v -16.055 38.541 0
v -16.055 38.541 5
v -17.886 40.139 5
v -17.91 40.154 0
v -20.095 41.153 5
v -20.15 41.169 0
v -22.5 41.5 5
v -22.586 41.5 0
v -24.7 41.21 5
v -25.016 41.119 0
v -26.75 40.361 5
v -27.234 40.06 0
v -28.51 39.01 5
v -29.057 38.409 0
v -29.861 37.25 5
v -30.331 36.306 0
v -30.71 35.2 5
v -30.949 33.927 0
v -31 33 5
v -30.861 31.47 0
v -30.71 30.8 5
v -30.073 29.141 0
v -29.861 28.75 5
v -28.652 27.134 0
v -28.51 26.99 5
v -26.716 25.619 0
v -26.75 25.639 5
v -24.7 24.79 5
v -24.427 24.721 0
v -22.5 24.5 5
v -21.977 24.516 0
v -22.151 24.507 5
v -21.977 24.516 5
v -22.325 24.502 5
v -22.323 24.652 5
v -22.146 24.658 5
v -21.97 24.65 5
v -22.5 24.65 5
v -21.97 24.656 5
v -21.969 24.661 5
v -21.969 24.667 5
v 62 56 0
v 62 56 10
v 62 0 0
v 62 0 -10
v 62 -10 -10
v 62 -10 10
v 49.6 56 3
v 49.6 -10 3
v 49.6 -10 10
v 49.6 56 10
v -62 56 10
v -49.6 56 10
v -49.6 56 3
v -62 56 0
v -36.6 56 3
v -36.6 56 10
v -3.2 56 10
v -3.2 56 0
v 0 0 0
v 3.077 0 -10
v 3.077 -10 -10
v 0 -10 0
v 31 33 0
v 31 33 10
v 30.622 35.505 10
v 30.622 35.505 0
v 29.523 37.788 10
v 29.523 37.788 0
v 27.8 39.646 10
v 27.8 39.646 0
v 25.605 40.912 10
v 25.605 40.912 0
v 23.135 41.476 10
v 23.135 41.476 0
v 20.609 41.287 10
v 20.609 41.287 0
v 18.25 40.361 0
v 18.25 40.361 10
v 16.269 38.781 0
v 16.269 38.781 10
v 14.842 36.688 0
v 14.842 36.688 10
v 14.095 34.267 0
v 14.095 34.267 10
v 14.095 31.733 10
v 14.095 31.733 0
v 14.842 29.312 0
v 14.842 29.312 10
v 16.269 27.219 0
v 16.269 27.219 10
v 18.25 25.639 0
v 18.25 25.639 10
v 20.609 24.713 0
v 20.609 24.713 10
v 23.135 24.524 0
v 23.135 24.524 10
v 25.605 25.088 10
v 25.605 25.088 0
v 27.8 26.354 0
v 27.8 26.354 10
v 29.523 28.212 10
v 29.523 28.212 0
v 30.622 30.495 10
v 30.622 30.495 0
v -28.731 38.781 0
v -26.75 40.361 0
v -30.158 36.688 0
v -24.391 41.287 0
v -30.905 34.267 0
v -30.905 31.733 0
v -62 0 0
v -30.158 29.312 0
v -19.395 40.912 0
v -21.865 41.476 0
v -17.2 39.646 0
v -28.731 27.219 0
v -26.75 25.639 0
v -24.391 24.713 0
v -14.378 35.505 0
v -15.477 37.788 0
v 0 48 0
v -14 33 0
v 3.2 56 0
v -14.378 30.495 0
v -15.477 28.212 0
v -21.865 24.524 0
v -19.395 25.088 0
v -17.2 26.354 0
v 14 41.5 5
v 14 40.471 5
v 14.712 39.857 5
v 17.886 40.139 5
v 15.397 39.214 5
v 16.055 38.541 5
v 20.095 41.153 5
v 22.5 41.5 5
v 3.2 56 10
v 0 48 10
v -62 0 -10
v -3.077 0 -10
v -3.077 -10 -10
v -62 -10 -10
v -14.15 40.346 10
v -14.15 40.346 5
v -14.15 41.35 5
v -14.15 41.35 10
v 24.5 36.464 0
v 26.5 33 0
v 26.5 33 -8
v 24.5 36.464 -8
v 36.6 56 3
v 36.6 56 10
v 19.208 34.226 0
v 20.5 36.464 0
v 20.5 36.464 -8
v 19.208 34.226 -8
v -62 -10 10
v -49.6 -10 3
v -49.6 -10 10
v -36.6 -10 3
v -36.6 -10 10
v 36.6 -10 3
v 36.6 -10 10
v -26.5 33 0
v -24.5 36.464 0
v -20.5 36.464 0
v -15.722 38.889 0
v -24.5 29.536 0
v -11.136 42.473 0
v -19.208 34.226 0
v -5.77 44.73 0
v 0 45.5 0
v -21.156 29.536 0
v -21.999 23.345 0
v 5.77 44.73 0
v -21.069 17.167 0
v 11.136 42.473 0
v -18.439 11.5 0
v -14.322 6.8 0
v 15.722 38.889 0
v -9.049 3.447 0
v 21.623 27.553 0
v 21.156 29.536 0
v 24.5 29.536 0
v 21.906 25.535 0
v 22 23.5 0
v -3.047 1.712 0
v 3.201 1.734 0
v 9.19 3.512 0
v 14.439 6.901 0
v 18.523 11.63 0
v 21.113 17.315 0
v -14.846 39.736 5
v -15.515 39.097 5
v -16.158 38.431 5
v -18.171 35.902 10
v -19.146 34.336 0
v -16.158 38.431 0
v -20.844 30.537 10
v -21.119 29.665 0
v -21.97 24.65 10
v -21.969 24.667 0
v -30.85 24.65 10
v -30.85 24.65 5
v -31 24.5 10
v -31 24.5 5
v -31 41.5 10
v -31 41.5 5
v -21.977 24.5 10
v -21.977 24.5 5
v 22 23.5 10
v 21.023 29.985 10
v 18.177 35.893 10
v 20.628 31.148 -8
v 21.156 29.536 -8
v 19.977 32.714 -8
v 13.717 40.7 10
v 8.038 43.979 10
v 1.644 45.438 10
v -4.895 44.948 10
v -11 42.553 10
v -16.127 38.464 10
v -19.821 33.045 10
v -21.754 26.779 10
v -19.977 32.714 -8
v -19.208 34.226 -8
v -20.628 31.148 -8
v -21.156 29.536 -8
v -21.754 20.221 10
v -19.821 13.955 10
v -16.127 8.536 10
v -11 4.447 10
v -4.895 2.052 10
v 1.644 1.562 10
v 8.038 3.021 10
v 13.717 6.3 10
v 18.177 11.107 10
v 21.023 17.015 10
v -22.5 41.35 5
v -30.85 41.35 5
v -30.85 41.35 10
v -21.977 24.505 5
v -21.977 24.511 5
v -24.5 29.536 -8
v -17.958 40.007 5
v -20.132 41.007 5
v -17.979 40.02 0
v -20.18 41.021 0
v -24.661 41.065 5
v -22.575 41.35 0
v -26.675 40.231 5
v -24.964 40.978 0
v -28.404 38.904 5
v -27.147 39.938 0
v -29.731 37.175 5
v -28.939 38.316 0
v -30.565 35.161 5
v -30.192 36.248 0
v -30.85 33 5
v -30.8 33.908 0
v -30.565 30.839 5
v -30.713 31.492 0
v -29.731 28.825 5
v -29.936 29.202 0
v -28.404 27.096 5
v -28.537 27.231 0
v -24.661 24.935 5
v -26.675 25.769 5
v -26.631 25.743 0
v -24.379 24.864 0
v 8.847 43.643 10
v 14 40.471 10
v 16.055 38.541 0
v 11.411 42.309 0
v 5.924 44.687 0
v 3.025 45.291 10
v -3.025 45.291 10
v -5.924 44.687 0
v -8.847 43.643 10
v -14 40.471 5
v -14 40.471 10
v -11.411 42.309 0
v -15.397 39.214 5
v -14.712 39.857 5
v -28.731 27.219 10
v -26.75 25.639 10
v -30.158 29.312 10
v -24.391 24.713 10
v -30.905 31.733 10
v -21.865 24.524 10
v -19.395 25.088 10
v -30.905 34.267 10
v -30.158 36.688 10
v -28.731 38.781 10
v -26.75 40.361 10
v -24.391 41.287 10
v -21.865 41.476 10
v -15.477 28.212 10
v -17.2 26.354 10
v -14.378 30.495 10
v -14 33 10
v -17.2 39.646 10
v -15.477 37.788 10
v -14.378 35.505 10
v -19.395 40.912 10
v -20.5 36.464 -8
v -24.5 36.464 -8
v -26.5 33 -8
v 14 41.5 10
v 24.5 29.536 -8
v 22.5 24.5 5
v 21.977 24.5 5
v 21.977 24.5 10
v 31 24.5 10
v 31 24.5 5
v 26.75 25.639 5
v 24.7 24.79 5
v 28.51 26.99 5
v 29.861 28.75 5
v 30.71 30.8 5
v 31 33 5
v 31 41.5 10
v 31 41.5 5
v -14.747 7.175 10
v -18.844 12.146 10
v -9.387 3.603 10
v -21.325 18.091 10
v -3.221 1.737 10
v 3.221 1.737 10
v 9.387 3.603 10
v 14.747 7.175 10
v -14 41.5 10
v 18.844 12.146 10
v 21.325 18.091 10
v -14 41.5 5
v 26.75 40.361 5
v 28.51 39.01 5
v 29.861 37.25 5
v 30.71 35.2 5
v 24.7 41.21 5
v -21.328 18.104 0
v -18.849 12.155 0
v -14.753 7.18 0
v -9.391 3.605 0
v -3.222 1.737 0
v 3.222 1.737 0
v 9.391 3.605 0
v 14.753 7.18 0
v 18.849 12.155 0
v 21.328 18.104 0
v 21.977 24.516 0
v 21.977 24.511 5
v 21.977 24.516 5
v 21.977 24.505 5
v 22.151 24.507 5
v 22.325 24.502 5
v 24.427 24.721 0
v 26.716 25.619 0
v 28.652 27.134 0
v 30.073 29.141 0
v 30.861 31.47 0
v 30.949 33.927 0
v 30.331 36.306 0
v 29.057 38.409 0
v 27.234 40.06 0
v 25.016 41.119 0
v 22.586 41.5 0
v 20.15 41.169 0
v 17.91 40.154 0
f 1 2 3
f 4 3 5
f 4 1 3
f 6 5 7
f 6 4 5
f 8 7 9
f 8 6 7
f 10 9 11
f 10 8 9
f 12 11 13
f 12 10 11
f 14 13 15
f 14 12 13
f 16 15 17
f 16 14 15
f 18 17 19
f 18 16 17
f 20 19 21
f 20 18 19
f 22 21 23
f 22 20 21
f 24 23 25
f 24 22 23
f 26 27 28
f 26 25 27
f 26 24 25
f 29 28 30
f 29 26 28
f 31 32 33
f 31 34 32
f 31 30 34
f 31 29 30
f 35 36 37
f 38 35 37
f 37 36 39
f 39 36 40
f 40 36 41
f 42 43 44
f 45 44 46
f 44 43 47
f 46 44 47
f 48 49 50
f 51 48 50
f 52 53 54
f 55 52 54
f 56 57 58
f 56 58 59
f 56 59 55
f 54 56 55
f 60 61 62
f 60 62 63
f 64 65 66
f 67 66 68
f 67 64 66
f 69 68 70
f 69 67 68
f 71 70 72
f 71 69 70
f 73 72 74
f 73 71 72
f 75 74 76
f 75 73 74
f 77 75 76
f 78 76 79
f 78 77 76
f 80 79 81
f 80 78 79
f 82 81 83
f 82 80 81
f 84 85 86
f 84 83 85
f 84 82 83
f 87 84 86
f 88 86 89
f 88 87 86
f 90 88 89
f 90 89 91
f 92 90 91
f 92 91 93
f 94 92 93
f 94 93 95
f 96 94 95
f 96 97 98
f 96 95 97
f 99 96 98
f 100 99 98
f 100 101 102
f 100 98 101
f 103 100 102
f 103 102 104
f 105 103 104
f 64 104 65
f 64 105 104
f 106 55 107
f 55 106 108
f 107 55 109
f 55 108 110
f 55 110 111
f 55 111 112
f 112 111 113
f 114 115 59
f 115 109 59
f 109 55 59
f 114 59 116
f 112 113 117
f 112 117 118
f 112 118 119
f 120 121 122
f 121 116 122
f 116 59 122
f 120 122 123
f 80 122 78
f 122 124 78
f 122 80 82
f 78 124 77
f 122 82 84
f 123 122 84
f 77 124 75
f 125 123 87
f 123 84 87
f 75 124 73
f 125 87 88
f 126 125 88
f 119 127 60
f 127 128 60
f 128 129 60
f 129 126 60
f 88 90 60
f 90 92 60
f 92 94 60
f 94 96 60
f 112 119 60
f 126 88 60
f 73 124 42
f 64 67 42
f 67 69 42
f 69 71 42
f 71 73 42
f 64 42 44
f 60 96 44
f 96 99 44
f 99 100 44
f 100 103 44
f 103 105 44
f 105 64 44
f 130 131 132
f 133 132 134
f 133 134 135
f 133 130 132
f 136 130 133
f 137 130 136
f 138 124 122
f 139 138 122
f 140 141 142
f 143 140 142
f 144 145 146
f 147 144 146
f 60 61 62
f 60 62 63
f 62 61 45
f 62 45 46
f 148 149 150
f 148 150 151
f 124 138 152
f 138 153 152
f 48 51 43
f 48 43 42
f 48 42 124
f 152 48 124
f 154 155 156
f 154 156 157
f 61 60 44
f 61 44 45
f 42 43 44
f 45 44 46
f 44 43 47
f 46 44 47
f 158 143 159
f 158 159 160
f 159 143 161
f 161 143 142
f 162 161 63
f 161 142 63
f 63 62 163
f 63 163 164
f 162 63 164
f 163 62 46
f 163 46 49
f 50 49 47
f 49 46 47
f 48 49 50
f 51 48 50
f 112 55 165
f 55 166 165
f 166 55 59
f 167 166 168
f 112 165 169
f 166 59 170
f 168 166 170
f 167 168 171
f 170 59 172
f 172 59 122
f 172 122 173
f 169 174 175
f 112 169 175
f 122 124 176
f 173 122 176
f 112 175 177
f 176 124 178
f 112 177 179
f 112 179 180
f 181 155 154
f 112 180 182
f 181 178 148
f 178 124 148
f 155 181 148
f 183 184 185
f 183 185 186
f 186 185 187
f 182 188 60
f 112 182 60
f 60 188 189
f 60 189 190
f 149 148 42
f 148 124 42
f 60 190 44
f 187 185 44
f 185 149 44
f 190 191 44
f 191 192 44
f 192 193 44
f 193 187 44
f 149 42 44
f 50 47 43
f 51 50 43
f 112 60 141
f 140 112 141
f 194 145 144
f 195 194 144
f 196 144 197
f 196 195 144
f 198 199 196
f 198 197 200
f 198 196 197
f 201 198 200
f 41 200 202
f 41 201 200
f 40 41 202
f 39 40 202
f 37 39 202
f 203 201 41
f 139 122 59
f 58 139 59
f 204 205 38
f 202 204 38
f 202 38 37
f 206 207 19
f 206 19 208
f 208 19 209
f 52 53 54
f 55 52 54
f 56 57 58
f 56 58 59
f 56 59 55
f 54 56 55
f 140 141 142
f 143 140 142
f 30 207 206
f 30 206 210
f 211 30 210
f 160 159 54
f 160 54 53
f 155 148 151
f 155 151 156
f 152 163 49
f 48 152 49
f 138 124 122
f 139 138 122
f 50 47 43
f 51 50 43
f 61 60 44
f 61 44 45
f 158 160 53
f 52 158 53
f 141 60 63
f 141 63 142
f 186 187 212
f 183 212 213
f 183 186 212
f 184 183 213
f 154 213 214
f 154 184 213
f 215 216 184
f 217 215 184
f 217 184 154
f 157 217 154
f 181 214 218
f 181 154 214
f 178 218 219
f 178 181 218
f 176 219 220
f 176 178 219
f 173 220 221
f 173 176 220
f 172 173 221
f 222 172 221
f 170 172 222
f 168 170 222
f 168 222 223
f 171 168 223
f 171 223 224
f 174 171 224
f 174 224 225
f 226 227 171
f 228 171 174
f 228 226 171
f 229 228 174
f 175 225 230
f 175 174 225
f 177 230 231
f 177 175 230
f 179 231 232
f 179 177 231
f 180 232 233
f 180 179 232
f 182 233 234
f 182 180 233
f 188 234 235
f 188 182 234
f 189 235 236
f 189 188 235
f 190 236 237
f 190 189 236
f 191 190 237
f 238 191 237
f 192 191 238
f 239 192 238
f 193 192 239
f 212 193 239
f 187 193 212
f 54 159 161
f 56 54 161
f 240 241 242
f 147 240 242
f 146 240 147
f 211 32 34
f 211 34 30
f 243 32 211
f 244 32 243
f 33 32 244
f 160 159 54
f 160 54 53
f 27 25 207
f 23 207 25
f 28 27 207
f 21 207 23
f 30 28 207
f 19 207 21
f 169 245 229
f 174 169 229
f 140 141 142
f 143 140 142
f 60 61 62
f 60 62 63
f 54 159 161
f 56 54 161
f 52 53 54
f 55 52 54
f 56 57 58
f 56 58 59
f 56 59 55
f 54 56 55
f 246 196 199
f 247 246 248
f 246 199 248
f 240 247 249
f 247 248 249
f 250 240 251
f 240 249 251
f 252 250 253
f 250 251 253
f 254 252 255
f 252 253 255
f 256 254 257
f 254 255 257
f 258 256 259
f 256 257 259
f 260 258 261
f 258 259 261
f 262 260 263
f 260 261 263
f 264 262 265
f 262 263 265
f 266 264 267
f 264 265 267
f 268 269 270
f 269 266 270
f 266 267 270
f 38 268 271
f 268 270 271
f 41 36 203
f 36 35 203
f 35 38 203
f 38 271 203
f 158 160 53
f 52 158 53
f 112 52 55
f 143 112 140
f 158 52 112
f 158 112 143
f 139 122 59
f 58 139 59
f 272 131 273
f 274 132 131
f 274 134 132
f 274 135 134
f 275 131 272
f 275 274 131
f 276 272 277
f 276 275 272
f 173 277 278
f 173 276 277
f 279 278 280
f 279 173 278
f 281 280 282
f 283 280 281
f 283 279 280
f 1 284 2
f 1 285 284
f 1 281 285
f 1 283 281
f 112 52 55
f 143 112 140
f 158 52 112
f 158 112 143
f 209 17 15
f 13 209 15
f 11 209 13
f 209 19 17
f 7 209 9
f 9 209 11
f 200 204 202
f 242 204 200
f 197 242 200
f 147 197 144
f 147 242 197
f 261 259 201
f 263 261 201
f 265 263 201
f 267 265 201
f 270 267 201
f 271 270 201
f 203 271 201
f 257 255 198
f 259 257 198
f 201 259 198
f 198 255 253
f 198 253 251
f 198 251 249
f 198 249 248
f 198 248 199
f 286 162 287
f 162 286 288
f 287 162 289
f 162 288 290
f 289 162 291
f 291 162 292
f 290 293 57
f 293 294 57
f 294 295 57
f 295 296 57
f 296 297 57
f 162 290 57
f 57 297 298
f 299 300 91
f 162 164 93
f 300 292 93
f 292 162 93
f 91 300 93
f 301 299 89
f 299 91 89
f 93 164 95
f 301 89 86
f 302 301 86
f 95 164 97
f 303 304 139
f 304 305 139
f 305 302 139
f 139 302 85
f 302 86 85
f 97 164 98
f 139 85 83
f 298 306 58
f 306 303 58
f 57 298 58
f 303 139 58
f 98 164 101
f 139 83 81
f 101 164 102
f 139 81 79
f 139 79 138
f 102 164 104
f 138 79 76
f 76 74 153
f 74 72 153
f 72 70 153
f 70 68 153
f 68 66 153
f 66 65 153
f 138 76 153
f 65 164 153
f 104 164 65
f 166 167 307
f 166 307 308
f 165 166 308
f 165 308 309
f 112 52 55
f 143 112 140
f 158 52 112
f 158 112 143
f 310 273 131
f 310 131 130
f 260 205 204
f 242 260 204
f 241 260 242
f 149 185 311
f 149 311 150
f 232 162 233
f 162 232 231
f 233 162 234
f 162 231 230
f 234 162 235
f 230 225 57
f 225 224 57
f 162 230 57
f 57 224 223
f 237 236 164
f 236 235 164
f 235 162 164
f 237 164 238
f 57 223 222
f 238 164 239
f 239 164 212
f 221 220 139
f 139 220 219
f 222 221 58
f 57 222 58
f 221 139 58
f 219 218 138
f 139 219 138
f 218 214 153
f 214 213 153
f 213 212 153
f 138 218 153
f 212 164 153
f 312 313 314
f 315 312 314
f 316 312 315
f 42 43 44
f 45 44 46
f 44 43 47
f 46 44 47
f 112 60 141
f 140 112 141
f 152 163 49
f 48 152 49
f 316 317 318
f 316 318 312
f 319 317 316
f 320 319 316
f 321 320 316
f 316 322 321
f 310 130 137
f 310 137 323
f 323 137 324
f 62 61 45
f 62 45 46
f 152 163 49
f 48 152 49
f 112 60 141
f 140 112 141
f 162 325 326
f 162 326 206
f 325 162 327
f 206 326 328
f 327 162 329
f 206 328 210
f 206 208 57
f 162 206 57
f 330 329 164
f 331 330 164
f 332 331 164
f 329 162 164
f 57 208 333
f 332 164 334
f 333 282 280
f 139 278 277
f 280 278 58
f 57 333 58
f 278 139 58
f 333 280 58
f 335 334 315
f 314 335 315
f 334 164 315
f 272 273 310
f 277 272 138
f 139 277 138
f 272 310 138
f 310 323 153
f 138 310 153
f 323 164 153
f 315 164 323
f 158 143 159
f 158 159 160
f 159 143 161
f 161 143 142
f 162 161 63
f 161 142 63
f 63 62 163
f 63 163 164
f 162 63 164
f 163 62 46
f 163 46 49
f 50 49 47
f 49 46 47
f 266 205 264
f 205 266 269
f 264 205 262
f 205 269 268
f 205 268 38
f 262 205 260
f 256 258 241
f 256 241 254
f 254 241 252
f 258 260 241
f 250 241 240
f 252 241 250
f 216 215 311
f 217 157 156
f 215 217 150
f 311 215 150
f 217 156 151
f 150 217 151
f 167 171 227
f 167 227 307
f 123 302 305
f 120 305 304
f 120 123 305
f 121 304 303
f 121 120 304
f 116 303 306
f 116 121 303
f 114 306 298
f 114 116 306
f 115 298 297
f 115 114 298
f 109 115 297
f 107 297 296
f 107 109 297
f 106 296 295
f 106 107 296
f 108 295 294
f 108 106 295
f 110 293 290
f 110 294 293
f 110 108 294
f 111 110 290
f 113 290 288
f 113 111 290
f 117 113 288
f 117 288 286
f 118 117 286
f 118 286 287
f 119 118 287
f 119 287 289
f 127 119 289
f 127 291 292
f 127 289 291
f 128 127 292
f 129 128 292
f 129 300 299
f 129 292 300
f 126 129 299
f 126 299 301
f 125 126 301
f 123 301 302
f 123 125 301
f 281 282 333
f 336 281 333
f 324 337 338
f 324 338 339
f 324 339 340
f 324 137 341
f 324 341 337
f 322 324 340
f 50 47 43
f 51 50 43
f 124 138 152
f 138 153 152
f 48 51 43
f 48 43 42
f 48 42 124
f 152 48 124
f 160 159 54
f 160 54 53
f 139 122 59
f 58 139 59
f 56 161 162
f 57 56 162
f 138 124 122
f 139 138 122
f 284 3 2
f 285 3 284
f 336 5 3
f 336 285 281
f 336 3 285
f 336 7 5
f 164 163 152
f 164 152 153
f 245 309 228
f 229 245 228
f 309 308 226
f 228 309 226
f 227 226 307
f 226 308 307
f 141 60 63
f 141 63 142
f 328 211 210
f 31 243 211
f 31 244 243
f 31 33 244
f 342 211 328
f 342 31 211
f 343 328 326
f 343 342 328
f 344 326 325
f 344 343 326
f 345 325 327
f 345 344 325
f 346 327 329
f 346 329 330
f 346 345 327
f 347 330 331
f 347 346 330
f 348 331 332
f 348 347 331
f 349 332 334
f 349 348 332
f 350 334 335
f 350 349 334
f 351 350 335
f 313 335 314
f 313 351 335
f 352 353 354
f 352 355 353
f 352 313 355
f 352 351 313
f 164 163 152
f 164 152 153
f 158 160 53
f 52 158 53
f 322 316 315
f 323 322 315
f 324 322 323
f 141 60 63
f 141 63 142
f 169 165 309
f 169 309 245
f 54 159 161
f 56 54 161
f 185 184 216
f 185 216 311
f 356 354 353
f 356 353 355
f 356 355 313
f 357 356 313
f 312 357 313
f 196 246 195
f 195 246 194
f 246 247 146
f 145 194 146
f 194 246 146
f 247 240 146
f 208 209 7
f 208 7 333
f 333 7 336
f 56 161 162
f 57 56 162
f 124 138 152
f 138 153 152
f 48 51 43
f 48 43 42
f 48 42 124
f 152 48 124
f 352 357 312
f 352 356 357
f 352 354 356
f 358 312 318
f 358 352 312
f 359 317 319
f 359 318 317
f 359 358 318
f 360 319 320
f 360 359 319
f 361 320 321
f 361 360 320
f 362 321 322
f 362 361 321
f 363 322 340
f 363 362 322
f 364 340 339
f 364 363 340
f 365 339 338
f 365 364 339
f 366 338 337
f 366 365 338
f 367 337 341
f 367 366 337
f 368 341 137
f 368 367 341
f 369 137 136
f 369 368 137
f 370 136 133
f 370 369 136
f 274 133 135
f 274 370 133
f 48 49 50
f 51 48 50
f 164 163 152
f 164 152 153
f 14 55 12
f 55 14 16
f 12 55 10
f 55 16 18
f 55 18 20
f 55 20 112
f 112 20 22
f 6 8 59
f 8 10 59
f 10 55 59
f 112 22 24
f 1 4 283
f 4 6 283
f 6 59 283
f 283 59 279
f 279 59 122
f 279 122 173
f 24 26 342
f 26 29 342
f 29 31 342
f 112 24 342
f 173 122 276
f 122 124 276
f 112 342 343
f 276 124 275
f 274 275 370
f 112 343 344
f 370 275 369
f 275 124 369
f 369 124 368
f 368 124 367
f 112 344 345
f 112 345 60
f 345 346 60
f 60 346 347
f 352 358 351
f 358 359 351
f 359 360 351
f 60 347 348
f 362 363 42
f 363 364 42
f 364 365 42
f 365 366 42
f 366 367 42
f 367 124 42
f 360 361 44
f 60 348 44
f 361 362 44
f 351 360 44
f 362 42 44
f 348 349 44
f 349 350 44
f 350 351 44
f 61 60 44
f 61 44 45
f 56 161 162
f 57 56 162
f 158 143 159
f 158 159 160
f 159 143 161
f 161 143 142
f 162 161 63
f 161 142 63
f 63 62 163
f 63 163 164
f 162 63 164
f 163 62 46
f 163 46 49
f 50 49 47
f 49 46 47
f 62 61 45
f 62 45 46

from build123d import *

# Parameters (mm, degrees)
PAD_DEPTH            = 62
SKETCH003_W          = 13
SKETCH003_H          = 8
POCKET_DEPTH         = 56.001
POCKET_DEPTH_BACK    = 10.001
POCKET001_DEPTH      = 10.001
POCKET002_DEPTH      = 10.001
SKETCH006_R          = 8.5
POCKET003_DEPTH      = 10.001
PAD001_DEPTH         = 8
SKETCH007_R          = 22
POCKET004_DEPTH      = 10.001
POCKET004_DEPTH_BACK = 10.001
SKETCH011_R          = 22
POCKET005_DEPTH      = 10.001
SKETCH009_R          = 8.5
POCKET006_DEPTH      = 10.001
POCKET007_START      = 5
SKETCH012_W          = 17
SKETCH012_H          = 17
POCKET007_DEPTH      = 5
SKETCH014_R          = 8.35
PAD002_DEPTH         = 10
PAD003_START         = 5
SKETCH015_W          = 16.7
SKETCH015_H          = 16.7
PAD003_DEPTH         = 5
SKETCH016_R          = 22
POCKET008_DEPTH      = 10.001


with BuildPart() as hingetemplatebasebody:
    # Sketch002 → Pad (new body, symmetric)
    with BuildSketch(Plane.YZ):
        Polygon((0, 0), (0, -10), (-10, -10), (-10, 10), (56, 10), (56, 0), align=None)
    extrude(amount=PAD_DEPTH, both=True)

    # Sketch003 → Pocket (cut, two sides)
    with BuildSketch(Plane.XZ) as pocket_sk:
        with Locations((-43.1, 7)):
            Rectangle(SKETCH003_W, SKETCH003_H)
        with Locations((43.1, 7)):
            Rectangle(SKETCH003_W, SKETCH003_H)
    extrude(amount=-POCKET_DEPTH, mode=Mode.SUBTRACT)
    extrude(pocket_sk.sketch, amount=POCKET_DEPTH_BACK, mode=Mode.SUBTRACT)

    # Sketch004 → Pocket001 (cut, through all)
    with BuildSketch(Plane.XY):
        Polygon((0, 48), (-4, 58), (4, 58), align=None)
    extrude(amount=POCKET001_DEPTH, mode=Mode.SUBTRACT)

    # Sketch005 → Pocket002 (cut, through all)
    with BuildSketch(Plane.XZ):
        Polygon((0, 0), (-4, -13), (4, -13), align=None)
    extrude(amount=POCKET002_DEPTH, mode=Mode.SUBTRACT)


with BuildPart() as hingetemplateholebody:
    # Body001 base: copy of HingeTemplateBaseBody
    add(hingetemplatebasebody.part)

    # Sketch006 → Pocket003 (cut, through all)
    with BuildSketch(Plane.XY):
        with Locations((-22.5, 33)):
            Circle(SKETCH006_R)
        with Locations((22.5, 33)):
            Circle(SKETCH006_R)
    extrude(amount=POCKET003_DEPTH, mode=Mode.SUBTRACT)


with BuildPart() as hingetemplatehingebody:
    # Body002 base: copy of HingeTemplateBaseBody
    add(hingetemplatebasebody.part)

    # Sketch008 → Pad001 (new body)
    with BuildSketch(Plane.XY):
        Polygon((-18.5, 33), (-20.5, 36.464102), (-24.5, 36.464102), (-26.5, 33), (-24.5, 29.535898), (-20.5, 29.535898), align=None)
        Polygon((24.5, 29.535898), (26.5, 33), (24.5, 36.464102), (20.5, 36.464102), (18.5, 33), (20.5, 29.535898), align=None)
    extrude(amount=-PAD001_DEPTH)

    # Sketch007 → Pocket004 (cut, two sides)
    with BuildSketch(Plane.XY) as pocket004_sk:
        with Locations((0, 23.5)):
            Circle(SKETCH007_R)
    extrude(amount=-POCKET004_DEPTH, mode=Mode.SUBTRACT)
    extrude(pocket004_sk.sketch, amount=POCKET004_DEPTH_BACK, mode=Mode.SUBTRACT)


with BuildPart() as hingetemplatebothbody:
    # Body003 base: copy of HingeTemplateBaseBody
    add(hingetemplatebasebody.part)

    # Sketch011 → Pocket005 (cut, through all)
    with BuildSketch(Plane.XY):
        with Locations((0, 23.5)):
            Circle(SKETCH011_R)
    extrude(amount=POCKET005_DEPTH, mode=Mode.SUBTRACT)

    # Sketch009 → Pocket006 (cut, through all)
    with BuildSketch(Plane.XY):
        with Locations((-22.5, 33)):
            Circle(SKETCH009_R)
        with Locations((22.5, 33)):
            Circle(SKETCH009_R)
    extrude(amount=POCKET006_DEPTH, mode=Mode.SUBTRACT)

    # Sketch012 → Pocket007 (cut)
    with BuildSketch(Plane.XY.offset(POCKET007_START)):
        with Locations((-22.5, 33)):
            Rectangle(SKETCH012_W, SKETCH012_H)
        with Locations((22.5, 33)):
            Rectangle(SKETCH012_W, SKETCH012_H)
    extrude(amount=POCKET007_DEPTH, mode=Mode.SUBTRACT)


with BuildPart() as inlay:
    # Sketch014 → Pad002 (new body)
    with BuildSketch(Plane.XY):
        with Locations((-22.5, 33)):
            Circle(SKETCH014_R)
    extrude(amount=PAD002_DEPTH)

    # Sketch015 → Pad003 (join)
    with BuildSketch(Plane.XY.offset(PAD003_START)):
        with Locations((-22.5, 33)):
            Rectangle(SKETCH015_W, SKETCH015_H)
    extrude(amount=PAD003_DEPTH)

    # Sketch016 → Pocket008 (cut, through all)
    with BuildSketch(Plane.XY):
        with Locations((0, 23.5)):
            Circle(SKETCH016_R)
    extrude(amount=POCKET008_DEPTH, mode=Mode.SUBTRACT)


solid = Compound([hingetemplateholebody.part, hingetemplatehingebody.part, hingetemplatebothbody.part, inlay.part])
